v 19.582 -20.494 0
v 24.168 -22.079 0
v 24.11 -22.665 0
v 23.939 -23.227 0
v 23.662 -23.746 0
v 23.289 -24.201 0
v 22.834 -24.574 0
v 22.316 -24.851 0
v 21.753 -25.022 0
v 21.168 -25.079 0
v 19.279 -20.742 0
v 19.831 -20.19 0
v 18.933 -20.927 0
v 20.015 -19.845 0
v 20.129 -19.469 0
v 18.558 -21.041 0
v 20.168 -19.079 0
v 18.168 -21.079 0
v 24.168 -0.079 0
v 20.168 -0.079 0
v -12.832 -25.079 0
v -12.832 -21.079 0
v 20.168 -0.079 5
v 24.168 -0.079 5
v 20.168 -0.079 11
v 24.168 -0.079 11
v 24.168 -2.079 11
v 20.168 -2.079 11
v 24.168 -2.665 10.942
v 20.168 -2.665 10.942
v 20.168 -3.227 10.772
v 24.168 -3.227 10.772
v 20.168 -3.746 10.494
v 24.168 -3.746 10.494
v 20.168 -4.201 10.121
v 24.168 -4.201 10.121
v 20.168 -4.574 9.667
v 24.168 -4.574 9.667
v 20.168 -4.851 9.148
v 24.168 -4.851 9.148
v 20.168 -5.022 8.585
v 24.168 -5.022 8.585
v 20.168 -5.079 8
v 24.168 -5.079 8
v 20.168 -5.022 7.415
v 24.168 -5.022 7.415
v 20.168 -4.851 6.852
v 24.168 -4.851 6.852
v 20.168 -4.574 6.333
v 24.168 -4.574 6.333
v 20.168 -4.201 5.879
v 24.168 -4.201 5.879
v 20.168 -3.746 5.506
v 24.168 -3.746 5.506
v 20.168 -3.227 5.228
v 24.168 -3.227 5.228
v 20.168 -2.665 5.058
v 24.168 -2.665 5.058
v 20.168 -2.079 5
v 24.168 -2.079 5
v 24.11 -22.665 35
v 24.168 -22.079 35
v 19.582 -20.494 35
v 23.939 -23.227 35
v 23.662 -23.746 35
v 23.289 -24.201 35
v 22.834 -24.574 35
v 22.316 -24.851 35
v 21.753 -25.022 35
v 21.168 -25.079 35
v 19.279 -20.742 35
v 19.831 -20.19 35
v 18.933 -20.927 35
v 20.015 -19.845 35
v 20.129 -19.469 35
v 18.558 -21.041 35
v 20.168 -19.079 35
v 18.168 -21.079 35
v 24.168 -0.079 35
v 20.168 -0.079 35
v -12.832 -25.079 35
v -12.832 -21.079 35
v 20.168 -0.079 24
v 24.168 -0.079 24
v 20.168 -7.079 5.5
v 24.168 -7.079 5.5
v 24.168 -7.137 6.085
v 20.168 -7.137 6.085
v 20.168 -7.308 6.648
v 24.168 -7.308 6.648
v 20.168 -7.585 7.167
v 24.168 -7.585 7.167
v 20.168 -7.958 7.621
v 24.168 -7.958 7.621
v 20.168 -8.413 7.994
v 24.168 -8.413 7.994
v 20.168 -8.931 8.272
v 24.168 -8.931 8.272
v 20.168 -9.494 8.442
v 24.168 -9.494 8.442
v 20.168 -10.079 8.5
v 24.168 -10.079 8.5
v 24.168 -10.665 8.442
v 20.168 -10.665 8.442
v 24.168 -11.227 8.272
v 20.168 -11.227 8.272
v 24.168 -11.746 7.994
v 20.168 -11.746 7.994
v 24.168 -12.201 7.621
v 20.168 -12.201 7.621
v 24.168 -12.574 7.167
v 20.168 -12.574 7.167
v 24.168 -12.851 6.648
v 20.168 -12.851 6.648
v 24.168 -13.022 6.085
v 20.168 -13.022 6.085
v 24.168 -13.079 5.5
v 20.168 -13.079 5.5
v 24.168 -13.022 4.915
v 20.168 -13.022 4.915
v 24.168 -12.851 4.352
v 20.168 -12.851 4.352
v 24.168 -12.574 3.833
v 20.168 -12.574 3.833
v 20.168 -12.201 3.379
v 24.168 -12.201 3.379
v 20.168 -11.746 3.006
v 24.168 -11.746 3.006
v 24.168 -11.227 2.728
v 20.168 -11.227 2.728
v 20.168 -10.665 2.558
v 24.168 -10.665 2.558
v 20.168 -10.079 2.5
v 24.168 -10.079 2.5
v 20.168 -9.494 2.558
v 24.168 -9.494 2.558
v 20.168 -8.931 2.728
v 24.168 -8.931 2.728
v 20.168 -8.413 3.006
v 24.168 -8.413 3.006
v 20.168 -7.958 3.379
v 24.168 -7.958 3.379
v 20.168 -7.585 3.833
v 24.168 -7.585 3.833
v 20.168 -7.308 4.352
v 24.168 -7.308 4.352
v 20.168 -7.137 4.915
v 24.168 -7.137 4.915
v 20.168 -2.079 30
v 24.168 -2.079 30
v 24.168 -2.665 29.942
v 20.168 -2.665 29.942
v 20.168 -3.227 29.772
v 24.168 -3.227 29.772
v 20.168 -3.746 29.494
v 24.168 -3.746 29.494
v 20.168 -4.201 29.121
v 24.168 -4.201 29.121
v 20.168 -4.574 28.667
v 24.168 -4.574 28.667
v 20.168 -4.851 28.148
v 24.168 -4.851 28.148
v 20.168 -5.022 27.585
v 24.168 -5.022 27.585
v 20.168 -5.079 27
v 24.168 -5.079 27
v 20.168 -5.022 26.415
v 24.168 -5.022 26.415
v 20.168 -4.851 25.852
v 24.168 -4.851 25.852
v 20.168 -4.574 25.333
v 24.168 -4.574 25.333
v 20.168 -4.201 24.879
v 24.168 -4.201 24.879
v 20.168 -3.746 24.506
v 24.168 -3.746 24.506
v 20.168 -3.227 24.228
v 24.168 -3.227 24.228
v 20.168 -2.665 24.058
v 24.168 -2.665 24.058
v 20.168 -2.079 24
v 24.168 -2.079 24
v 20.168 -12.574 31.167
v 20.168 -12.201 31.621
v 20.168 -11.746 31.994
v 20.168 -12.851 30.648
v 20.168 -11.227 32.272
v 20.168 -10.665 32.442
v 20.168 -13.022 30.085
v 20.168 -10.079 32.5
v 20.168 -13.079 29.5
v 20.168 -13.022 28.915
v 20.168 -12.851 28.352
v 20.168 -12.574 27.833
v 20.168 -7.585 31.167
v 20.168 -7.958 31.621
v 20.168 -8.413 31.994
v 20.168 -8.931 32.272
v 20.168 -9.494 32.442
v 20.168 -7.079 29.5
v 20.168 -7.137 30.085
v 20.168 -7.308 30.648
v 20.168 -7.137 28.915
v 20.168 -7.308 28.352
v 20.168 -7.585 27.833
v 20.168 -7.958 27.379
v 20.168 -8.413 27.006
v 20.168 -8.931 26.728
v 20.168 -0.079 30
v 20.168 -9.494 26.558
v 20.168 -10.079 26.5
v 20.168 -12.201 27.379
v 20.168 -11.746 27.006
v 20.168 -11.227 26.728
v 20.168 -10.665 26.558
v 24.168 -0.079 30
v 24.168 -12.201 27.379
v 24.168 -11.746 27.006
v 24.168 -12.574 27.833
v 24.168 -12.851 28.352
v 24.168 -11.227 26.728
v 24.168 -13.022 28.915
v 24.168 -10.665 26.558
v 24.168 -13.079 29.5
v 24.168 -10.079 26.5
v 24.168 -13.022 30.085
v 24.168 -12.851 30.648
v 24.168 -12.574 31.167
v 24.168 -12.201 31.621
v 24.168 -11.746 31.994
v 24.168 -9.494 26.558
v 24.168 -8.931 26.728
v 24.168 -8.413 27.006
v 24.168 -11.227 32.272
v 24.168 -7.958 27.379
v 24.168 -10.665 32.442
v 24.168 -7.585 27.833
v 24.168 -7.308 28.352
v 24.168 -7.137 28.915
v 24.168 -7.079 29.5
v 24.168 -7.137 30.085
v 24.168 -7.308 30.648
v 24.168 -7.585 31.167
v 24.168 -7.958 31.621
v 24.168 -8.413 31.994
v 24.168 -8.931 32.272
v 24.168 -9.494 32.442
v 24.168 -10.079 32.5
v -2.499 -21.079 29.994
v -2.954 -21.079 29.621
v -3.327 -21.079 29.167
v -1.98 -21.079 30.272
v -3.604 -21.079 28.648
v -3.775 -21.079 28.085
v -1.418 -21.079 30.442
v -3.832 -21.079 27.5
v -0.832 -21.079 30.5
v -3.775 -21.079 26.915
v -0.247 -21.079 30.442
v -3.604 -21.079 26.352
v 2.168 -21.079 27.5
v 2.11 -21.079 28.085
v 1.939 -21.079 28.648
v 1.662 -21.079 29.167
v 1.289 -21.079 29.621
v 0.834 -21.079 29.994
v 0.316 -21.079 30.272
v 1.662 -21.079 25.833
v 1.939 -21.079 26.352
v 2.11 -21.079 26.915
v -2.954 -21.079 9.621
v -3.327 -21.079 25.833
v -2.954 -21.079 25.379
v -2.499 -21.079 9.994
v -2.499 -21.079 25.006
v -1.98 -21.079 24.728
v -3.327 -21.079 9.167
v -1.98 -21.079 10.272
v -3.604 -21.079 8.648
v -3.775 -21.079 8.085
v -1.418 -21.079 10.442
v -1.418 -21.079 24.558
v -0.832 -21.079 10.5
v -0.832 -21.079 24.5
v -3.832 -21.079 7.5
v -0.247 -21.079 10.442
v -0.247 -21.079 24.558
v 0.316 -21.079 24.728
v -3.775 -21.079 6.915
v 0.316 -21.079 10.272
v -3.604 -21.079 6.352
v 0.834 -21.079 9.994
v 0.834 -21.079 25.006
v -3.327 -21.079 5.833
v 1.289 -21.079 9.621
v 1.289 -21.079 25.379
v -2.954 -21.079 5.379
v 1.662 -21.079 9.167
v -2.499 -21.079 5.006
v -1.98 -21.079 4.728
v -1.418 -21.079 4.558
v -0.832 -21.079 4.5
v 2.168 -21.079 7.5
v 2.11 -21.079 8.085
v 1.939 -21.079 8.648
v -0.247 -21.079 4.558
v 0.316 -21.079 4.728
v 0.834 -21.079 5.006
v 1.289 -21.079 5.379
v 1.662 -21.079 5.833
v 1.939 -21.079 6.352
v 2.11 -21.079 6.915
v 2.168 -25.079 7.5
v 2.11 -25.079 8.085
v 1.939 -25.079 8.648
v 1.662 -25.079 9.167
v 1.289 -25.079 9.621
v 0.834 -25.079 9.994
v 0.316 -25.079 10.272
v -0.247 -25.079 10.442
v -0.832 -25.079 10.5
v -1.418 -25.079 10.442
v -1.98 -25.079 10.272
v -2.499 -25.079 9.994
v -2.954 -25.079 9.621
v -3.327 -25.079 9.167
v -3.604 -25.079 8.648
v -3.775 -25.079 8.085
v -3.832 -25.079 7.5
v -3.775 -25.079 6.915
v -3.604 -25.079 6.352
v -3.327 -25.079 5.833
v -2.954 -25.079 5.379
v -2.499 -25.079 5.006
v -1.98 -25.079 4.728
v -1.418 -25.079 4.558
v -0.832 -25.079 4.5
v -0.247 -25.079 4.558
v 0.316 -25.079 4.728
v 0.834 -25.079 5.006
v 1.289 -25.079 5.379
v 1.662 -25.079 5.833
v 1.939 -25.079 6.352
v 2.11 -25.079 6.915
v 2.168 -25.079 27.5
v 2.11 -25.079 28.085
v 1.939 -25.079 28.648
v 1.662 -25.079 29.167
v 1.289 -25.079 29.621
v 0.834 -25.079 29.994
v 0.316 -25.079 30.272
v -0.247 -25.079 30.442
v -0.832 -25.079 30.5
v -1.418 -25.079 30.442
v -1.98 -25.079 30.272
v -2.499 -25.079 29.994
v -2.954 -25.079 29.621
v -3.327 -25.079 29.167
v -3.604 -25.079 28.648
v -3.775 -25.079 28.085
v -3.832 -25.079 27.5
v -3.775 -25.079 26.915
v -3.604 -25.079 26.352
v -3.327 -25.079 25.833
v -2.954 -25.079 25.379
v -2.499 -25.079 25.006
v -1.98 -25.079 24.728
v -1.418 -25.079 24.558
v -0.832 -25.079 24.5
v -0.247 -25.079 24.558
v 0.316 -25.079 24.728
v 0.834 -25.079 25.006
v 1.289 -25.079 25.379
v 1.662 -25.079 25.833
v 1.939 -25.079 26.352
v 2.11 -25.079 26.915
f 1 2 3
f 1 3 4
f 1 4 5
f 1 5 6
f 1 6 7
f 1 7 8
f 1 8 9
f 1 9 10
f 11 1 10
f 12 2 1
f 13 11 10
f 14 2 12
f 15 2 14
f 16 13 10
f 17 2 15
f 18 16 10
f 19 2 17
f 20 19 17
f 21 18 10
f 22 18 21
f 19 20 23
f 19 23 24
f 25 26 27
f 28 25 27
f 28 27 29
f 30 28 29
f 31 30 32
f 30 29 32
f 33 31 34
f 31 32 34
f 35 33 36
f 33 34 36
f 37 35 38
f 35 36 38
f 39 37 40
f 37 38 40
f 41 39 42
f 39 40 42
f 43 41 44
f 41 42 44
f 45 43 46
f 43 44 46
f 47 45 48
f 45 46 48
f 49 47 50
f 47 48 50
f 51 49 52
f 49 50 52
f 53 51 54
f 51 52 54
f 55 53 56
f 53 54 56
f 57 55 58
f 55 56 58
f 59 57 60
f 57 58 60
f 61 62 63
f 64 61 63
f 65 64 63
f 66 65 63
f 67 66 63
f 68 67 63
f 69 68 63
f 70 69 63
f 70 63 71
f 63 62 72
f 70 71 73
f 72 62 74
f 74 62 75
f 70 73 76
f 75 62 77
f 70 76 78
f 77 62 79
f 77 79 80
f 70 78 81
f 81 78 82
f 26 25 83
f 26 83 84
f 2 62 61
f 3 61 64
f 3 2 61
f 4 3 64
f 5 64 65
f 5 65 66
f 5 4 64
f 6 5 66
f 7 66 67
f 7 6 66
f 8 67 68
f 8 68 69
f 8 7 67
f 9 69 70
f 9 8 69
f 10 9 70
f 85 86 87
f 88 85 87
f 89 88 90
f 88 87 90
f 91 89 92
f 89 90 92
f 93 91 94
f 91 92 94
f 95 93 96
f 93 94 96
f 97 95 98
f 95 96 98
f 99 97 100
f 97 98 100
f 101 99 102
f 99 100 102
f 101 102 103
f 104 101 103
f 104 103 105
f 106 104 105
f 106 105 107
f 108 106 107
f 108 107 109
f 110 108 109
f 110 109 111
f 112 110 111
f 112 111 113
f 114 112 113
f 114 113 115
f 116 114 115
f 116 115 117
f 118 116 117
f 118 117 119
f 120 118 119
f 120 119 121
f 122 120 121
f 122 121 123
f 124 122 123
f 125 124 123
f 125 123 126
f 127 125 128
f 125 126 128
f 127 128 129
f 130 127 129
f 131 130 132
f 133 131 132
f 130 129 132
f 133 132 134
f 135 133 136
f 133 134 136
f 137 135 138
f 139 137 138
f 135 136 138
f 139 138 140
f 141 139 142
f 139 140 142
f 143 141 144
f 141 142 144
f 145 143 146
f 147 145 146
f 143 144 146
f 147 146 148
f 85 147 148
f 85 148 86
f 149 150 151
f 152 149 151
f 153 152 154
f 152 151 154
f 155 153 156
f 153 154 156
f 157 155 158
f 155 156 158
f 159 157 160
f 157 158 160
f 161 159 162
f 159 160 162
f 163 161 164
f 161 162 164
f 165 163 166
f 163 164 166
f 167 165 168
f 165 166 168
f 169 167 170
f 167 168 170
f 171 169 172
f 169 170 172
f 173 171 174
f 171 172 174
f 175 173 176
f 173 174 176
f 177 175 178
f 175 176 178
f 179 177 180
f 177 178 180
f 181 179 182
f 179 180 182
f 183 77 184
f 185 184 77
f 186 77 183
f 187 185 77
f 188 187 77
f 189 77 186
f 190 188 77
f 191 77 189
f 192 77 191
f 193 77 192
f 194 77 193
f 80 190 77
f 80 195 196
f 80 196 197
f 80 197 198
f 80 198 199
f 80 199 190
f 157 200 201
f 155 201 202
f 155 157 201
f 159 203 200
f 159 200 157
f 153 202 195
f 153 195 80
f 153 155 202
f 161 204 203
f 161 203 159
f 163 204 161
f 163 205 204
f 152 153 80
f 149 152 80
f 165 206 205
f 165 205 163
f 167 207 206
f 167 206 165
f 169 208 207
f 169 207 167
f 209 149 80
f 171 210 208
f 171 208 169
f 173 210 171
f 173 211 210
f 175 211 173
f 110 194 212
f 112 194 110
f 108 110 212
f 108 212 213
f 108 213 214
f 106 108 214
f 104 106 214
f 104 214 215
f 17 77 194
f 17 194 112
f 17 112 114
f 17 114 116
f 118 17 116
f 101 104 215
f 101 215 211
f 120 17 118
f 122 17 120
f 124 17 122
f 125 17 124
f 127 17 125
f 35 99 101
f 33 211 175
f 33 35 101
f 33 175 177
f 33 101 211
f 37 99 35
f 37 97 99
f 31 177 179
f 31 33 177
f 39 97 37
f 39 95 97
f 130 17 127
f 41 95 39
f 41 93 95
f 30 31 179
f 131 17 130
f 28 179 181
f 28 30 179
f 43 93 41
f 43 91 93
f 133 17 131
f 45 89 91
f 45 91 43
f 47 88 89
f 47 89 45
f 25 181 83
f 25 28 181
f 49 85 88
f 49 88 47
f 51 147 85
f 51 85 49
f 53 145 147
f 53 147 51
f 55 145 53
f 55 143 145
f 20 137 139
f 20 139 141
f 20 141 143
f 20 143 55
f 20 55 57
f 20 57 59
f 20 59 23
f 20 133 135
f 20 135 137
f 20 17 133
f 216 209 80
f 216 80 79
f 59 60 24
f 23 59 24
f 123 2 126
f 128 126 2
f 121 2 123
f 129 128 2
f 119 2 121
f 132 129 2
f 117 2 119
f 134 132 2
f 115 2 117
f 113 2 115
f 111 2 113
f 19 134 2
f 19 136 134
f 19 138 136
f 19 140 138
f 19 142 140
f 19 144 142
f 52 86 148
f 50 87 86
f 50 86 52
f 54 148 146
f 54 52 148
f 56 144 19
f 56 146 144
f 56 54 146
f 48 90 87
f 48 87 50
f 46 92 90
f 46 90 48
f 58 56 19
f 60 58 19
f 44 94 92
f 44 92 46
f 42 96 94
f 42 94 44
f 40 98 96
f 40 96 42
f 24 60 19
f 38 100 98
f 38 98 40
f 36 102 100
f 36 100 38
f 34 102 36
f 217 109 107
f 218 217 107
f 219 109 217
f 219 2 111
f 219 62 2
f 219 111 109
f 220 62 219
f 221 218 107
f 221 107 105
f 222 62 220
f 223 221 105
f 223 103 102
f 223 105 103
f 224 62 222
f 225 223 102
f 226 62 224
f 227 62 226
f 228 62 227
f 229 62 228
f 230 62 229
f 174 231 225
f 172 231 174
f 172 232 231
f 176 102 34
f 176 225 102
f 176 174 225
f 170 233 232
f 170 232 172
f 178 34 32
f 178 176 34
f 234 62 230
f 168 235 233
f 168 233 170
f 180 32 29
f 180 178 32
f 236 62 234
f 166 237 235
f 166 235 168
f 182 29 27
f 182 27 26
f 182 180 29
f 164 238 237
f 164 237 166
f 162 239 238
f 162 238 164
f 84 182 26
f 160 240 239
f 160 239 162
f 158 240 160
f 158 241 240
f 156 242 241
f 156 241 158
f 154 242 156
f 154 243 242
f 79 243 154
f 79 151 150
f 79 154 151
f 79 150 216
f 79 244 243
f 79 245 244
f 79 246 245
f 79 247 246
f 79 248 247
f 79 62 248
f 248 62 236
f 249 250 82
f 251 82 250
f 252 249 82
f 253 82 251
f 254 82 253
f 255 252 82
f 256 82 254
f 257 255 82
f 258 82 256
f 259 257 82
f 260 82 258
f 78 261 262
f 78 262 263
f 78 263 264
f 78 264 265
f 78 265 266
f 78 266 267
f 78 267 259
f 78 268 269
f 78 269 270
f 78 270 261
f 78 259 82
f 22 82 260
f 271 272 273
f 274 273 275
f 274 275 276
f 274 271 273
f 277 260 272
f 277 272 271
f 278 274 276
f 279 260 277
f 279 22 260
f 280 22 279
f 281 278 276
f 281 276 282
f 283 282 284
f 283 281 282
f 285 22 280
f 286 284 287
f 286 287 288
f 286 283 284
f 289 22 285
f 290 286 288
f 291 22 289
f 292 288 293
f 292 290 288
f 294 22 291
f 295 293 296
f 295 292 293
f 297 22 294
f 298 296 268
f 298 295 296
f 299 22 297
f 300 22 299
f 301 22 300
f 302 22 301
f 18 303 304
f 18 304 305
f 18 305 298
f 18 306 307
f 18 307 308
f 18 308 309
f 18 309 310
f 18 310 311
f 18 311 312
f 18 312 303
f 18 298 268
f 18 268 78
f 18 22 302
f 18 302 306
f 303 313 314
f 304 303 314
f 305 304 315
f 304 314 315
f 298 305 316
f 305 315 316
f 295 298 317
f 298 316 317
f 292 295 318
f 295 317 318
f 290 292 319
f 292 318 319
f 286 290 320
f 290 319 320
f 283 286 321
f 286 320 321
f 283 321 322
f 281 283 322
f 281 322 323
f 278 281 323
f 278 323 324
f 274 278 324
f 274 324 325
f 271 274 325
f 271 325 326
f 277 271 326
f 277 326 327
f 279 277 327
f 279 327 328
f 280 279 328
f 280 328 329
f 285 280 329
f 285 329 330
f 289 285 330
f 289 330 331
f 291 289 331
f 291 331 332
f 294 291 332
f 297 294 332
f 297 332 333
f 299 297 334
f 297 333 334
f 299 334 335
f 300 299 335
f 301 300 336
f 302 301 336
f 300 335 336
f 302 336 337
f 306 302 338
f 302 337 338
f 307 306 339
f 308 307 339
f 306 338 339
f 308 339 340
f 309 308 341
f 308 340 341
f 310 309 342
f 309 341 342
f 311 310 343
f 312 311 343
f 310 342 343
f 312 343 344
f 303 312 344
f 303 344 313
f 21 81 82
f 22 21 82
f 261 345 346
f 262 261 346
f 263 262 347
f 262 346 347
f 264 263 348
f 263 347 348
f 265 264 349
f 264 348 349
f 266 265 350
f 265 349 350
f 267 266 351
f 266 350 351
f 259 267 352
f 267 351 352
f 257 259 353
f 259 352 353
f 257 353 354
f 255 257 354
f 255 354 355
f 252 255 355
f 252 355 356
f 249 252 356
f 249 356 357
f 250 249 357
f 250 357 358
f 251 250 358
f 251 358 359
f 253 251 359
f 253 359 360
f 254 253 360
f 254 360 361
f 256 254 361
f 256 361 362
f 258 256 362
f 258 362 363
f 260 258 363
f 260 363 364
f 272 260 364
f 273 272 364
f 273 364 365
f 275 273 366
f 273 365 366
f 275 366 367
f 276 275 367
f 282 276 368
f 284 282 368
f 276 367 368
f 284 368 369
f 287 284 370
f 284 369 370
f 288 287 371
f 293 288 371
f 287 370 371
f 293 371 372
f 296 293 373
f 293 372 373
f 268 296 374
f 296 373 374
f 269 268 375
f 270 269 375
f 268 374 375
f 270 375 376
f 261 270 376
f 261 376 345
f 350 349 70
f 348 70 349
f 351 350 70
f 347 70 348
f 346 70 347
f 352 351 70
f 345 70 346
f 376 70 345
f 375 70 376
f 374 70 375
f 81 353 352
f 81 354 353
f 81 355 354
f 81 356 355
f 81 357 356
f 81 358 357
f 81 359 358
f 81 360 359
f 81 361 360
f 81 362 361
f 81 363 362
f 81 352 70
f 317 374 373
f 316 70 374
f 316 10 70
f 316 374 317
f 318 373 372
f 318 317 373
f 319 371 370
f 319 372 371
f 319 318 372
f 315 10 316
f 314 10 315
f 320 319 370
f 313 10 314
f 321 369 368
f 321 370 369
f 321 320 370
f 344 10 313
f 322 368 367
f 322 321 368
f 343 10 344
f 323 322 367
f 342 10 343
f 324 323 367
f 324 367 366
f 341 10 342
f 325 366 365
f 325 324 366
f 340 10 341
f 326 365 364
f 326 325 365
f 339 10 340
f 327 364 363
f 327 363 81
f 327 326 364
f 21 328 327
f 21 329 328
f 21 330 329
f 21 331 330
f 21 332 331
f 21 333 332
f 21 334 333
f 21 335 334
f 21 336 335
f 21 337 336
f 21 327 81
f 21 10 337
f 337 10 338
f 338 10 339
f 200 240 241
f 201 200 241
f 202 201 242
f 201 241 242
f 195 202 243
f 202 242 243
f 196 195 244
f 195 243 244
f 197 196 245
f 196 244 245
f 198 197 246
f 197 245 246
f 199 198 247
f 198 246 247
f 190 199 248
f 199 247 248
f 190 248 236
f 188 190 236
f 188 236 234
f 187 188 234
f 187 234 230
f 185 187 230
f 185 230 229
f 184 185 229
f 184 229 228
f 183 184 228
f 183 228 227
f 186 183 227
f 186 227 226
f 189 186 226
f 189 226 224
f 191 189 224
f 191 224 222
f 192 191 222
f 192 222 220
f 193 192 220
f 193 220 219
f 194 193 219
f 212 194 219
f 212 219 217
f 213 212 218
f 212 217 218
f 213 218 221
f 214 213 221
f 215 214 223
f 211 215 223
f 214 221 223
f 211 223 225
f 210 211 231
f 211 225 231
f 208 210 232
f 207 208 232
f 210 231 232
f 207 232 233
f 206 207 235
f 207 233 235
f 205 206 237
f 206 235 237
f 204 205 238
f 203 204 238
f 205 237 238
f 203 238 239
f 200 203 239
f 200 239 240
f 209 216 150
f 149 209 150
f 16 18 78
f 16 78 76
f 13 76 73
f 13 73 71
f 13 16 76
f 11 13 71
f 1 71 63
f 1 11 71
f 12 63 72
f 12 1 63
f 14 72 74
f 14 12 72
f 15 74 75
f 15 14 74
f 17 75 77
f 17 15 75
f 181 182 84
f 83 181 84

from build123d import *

# Parameters (mm, degrees)
EXTRUDE_1_DEPTH     = 35
SKETCH_2_R          = 3
CUT_EXTRUDE_2_DEPTH = 35
SKETCH_3_R          = 3
EXTRUDE_4_DEPTH     = 37
SKETCH_3_2_R        = 3
CUT_EXTRUDE_5_DEPTH = 57.771215716


with BuildPart() as part:
    # 草图1 → 拉伸1 (new body)
    with BuildSketch(Plane.XY):
        with BuildLine():
            ThreePointArc((18.167628925, -21.079292929), (19.581842488, -20.493506492), (20.167628925, -19.079292929))
            Line((20.167628925, -19.079292929), (20.167628925, -0.079292929))
            Line((20.167628925, -0.079292929), (24.167628925, -0.079292929))
            Line((24.167628925, -0.079292929), (24.167628925, -22.079292929))
            ThreePointArc((24.167628925, -22.079292929), (23.288949269, -24.200613273), (21.167628925, -25.079292929))
            Line((21.167628925, -25.079292929), (-12.832371075, -25.079292929))
            Line((-12.832371075, -25.079292929), (-12.832371075, -21.079292929))
            Line((-12.832371075, -21.079292929), (18.167628925, -21.079292929))
        make_face()
    extrude(amount=EXTRUDE_1_DEPTH)

    # 草图2 → 拉伸2 (cut)
    with BuildSketch(Plane.XZ.offset(25.079292929)):
        with Locations((-0.832371075, 7.5)):
            Circle(SKETCH_2_R)
        with Locations((-0.832371075, 27.5)):
            Circle(SKETCH_2_R)
    extrude(amount=-CUT_EXTRUDE_2_DEPTH, mode=Mode.SUBTRACT)

    # 草图3 → 拉伸4 (add, through all)
    with BuildSketch(Plane(origin=(24.167628925, 0, 0), x_dir=(0, 0, -1), z_dir=(1, 0, 0))):
        with Locations(Location((-5.5, -10.079292929, 0), (0, 0, 90))):
            Circle(SKETCH_3_R)
        with Locations(Location((-29.5, -10.079292929, 0), (0, 0, 90))):
            Circle(SKETCH_3_R)
        with BuildLine():
            Line((-5, -2.079292929), (-5, 0.455458984))
            Line((-5, 0.455458984), (-11, 0.455458984))
            Line((-11, 0.455458984), (-11, -2.079292929))
            ThreePointArc((-11, -2.079292929), (-8, -5.079292929), (-5, -2.079292929))
        make_face()
        with BuildLine():
            Line((-24, -2.079292929), (-24, 0.455458984))
            Line((-24, 0.455458984), (-30, 0.455458984))
            Line((-30, 0.455458984), (-30, -2.079292929))
            ThreePointArc((-30, -2.079292929), (-27, -5.079292929), (-24, -2.079292929))
        make_face()
    extrude(amount=-EXTRUDE_4_DEPTH)

    # 草图3<2> → 拉伸5 (cut, through all)
    with BuildSketch(Plane(origin=(24.167628925, 0, 0), x_dir=(0, 0, -1), z_dir=(1, 0, 0))):
        with Locations(Location((-5.5, -10.079292929, 0), (0, 0, 90))):
            Circle(SKETCH_3_2_R)
        with Locations(Location((-29.5, -10.079292929, 0), (0, 0, 90))):
            Circle(SKETCH_3_2_R)
        with BuildLine():
            Line((-5, -2.079292929), (-5, 0.455458984))
            Line((-5, 0.455458984), (-11, 0.455458984))
            Line((-11, 0.455458984), (-11, -2.079292929))
            ThreePointArc((-11, -2.079292929), (-8, -5.079292929), (-5, -2.079292929))
        make_face()
        with BuildLine():
            Line((-24, -2.079292929), (-24, 0.455458984))
            Line((-24, 0.455458984), (-30, 0.455458984))
            Line((-30, 0.455458984), (-30, -2.079292929))
            ThreePointArc((-30, -2.079292929), (-27, -5.079292929), (-24, -2.079292929))
        make_face()
    extrude(amount=-CUT_EXTRUDE_5_DEPTH, mode=Mode.SUBTRACT)


solid = part.part
